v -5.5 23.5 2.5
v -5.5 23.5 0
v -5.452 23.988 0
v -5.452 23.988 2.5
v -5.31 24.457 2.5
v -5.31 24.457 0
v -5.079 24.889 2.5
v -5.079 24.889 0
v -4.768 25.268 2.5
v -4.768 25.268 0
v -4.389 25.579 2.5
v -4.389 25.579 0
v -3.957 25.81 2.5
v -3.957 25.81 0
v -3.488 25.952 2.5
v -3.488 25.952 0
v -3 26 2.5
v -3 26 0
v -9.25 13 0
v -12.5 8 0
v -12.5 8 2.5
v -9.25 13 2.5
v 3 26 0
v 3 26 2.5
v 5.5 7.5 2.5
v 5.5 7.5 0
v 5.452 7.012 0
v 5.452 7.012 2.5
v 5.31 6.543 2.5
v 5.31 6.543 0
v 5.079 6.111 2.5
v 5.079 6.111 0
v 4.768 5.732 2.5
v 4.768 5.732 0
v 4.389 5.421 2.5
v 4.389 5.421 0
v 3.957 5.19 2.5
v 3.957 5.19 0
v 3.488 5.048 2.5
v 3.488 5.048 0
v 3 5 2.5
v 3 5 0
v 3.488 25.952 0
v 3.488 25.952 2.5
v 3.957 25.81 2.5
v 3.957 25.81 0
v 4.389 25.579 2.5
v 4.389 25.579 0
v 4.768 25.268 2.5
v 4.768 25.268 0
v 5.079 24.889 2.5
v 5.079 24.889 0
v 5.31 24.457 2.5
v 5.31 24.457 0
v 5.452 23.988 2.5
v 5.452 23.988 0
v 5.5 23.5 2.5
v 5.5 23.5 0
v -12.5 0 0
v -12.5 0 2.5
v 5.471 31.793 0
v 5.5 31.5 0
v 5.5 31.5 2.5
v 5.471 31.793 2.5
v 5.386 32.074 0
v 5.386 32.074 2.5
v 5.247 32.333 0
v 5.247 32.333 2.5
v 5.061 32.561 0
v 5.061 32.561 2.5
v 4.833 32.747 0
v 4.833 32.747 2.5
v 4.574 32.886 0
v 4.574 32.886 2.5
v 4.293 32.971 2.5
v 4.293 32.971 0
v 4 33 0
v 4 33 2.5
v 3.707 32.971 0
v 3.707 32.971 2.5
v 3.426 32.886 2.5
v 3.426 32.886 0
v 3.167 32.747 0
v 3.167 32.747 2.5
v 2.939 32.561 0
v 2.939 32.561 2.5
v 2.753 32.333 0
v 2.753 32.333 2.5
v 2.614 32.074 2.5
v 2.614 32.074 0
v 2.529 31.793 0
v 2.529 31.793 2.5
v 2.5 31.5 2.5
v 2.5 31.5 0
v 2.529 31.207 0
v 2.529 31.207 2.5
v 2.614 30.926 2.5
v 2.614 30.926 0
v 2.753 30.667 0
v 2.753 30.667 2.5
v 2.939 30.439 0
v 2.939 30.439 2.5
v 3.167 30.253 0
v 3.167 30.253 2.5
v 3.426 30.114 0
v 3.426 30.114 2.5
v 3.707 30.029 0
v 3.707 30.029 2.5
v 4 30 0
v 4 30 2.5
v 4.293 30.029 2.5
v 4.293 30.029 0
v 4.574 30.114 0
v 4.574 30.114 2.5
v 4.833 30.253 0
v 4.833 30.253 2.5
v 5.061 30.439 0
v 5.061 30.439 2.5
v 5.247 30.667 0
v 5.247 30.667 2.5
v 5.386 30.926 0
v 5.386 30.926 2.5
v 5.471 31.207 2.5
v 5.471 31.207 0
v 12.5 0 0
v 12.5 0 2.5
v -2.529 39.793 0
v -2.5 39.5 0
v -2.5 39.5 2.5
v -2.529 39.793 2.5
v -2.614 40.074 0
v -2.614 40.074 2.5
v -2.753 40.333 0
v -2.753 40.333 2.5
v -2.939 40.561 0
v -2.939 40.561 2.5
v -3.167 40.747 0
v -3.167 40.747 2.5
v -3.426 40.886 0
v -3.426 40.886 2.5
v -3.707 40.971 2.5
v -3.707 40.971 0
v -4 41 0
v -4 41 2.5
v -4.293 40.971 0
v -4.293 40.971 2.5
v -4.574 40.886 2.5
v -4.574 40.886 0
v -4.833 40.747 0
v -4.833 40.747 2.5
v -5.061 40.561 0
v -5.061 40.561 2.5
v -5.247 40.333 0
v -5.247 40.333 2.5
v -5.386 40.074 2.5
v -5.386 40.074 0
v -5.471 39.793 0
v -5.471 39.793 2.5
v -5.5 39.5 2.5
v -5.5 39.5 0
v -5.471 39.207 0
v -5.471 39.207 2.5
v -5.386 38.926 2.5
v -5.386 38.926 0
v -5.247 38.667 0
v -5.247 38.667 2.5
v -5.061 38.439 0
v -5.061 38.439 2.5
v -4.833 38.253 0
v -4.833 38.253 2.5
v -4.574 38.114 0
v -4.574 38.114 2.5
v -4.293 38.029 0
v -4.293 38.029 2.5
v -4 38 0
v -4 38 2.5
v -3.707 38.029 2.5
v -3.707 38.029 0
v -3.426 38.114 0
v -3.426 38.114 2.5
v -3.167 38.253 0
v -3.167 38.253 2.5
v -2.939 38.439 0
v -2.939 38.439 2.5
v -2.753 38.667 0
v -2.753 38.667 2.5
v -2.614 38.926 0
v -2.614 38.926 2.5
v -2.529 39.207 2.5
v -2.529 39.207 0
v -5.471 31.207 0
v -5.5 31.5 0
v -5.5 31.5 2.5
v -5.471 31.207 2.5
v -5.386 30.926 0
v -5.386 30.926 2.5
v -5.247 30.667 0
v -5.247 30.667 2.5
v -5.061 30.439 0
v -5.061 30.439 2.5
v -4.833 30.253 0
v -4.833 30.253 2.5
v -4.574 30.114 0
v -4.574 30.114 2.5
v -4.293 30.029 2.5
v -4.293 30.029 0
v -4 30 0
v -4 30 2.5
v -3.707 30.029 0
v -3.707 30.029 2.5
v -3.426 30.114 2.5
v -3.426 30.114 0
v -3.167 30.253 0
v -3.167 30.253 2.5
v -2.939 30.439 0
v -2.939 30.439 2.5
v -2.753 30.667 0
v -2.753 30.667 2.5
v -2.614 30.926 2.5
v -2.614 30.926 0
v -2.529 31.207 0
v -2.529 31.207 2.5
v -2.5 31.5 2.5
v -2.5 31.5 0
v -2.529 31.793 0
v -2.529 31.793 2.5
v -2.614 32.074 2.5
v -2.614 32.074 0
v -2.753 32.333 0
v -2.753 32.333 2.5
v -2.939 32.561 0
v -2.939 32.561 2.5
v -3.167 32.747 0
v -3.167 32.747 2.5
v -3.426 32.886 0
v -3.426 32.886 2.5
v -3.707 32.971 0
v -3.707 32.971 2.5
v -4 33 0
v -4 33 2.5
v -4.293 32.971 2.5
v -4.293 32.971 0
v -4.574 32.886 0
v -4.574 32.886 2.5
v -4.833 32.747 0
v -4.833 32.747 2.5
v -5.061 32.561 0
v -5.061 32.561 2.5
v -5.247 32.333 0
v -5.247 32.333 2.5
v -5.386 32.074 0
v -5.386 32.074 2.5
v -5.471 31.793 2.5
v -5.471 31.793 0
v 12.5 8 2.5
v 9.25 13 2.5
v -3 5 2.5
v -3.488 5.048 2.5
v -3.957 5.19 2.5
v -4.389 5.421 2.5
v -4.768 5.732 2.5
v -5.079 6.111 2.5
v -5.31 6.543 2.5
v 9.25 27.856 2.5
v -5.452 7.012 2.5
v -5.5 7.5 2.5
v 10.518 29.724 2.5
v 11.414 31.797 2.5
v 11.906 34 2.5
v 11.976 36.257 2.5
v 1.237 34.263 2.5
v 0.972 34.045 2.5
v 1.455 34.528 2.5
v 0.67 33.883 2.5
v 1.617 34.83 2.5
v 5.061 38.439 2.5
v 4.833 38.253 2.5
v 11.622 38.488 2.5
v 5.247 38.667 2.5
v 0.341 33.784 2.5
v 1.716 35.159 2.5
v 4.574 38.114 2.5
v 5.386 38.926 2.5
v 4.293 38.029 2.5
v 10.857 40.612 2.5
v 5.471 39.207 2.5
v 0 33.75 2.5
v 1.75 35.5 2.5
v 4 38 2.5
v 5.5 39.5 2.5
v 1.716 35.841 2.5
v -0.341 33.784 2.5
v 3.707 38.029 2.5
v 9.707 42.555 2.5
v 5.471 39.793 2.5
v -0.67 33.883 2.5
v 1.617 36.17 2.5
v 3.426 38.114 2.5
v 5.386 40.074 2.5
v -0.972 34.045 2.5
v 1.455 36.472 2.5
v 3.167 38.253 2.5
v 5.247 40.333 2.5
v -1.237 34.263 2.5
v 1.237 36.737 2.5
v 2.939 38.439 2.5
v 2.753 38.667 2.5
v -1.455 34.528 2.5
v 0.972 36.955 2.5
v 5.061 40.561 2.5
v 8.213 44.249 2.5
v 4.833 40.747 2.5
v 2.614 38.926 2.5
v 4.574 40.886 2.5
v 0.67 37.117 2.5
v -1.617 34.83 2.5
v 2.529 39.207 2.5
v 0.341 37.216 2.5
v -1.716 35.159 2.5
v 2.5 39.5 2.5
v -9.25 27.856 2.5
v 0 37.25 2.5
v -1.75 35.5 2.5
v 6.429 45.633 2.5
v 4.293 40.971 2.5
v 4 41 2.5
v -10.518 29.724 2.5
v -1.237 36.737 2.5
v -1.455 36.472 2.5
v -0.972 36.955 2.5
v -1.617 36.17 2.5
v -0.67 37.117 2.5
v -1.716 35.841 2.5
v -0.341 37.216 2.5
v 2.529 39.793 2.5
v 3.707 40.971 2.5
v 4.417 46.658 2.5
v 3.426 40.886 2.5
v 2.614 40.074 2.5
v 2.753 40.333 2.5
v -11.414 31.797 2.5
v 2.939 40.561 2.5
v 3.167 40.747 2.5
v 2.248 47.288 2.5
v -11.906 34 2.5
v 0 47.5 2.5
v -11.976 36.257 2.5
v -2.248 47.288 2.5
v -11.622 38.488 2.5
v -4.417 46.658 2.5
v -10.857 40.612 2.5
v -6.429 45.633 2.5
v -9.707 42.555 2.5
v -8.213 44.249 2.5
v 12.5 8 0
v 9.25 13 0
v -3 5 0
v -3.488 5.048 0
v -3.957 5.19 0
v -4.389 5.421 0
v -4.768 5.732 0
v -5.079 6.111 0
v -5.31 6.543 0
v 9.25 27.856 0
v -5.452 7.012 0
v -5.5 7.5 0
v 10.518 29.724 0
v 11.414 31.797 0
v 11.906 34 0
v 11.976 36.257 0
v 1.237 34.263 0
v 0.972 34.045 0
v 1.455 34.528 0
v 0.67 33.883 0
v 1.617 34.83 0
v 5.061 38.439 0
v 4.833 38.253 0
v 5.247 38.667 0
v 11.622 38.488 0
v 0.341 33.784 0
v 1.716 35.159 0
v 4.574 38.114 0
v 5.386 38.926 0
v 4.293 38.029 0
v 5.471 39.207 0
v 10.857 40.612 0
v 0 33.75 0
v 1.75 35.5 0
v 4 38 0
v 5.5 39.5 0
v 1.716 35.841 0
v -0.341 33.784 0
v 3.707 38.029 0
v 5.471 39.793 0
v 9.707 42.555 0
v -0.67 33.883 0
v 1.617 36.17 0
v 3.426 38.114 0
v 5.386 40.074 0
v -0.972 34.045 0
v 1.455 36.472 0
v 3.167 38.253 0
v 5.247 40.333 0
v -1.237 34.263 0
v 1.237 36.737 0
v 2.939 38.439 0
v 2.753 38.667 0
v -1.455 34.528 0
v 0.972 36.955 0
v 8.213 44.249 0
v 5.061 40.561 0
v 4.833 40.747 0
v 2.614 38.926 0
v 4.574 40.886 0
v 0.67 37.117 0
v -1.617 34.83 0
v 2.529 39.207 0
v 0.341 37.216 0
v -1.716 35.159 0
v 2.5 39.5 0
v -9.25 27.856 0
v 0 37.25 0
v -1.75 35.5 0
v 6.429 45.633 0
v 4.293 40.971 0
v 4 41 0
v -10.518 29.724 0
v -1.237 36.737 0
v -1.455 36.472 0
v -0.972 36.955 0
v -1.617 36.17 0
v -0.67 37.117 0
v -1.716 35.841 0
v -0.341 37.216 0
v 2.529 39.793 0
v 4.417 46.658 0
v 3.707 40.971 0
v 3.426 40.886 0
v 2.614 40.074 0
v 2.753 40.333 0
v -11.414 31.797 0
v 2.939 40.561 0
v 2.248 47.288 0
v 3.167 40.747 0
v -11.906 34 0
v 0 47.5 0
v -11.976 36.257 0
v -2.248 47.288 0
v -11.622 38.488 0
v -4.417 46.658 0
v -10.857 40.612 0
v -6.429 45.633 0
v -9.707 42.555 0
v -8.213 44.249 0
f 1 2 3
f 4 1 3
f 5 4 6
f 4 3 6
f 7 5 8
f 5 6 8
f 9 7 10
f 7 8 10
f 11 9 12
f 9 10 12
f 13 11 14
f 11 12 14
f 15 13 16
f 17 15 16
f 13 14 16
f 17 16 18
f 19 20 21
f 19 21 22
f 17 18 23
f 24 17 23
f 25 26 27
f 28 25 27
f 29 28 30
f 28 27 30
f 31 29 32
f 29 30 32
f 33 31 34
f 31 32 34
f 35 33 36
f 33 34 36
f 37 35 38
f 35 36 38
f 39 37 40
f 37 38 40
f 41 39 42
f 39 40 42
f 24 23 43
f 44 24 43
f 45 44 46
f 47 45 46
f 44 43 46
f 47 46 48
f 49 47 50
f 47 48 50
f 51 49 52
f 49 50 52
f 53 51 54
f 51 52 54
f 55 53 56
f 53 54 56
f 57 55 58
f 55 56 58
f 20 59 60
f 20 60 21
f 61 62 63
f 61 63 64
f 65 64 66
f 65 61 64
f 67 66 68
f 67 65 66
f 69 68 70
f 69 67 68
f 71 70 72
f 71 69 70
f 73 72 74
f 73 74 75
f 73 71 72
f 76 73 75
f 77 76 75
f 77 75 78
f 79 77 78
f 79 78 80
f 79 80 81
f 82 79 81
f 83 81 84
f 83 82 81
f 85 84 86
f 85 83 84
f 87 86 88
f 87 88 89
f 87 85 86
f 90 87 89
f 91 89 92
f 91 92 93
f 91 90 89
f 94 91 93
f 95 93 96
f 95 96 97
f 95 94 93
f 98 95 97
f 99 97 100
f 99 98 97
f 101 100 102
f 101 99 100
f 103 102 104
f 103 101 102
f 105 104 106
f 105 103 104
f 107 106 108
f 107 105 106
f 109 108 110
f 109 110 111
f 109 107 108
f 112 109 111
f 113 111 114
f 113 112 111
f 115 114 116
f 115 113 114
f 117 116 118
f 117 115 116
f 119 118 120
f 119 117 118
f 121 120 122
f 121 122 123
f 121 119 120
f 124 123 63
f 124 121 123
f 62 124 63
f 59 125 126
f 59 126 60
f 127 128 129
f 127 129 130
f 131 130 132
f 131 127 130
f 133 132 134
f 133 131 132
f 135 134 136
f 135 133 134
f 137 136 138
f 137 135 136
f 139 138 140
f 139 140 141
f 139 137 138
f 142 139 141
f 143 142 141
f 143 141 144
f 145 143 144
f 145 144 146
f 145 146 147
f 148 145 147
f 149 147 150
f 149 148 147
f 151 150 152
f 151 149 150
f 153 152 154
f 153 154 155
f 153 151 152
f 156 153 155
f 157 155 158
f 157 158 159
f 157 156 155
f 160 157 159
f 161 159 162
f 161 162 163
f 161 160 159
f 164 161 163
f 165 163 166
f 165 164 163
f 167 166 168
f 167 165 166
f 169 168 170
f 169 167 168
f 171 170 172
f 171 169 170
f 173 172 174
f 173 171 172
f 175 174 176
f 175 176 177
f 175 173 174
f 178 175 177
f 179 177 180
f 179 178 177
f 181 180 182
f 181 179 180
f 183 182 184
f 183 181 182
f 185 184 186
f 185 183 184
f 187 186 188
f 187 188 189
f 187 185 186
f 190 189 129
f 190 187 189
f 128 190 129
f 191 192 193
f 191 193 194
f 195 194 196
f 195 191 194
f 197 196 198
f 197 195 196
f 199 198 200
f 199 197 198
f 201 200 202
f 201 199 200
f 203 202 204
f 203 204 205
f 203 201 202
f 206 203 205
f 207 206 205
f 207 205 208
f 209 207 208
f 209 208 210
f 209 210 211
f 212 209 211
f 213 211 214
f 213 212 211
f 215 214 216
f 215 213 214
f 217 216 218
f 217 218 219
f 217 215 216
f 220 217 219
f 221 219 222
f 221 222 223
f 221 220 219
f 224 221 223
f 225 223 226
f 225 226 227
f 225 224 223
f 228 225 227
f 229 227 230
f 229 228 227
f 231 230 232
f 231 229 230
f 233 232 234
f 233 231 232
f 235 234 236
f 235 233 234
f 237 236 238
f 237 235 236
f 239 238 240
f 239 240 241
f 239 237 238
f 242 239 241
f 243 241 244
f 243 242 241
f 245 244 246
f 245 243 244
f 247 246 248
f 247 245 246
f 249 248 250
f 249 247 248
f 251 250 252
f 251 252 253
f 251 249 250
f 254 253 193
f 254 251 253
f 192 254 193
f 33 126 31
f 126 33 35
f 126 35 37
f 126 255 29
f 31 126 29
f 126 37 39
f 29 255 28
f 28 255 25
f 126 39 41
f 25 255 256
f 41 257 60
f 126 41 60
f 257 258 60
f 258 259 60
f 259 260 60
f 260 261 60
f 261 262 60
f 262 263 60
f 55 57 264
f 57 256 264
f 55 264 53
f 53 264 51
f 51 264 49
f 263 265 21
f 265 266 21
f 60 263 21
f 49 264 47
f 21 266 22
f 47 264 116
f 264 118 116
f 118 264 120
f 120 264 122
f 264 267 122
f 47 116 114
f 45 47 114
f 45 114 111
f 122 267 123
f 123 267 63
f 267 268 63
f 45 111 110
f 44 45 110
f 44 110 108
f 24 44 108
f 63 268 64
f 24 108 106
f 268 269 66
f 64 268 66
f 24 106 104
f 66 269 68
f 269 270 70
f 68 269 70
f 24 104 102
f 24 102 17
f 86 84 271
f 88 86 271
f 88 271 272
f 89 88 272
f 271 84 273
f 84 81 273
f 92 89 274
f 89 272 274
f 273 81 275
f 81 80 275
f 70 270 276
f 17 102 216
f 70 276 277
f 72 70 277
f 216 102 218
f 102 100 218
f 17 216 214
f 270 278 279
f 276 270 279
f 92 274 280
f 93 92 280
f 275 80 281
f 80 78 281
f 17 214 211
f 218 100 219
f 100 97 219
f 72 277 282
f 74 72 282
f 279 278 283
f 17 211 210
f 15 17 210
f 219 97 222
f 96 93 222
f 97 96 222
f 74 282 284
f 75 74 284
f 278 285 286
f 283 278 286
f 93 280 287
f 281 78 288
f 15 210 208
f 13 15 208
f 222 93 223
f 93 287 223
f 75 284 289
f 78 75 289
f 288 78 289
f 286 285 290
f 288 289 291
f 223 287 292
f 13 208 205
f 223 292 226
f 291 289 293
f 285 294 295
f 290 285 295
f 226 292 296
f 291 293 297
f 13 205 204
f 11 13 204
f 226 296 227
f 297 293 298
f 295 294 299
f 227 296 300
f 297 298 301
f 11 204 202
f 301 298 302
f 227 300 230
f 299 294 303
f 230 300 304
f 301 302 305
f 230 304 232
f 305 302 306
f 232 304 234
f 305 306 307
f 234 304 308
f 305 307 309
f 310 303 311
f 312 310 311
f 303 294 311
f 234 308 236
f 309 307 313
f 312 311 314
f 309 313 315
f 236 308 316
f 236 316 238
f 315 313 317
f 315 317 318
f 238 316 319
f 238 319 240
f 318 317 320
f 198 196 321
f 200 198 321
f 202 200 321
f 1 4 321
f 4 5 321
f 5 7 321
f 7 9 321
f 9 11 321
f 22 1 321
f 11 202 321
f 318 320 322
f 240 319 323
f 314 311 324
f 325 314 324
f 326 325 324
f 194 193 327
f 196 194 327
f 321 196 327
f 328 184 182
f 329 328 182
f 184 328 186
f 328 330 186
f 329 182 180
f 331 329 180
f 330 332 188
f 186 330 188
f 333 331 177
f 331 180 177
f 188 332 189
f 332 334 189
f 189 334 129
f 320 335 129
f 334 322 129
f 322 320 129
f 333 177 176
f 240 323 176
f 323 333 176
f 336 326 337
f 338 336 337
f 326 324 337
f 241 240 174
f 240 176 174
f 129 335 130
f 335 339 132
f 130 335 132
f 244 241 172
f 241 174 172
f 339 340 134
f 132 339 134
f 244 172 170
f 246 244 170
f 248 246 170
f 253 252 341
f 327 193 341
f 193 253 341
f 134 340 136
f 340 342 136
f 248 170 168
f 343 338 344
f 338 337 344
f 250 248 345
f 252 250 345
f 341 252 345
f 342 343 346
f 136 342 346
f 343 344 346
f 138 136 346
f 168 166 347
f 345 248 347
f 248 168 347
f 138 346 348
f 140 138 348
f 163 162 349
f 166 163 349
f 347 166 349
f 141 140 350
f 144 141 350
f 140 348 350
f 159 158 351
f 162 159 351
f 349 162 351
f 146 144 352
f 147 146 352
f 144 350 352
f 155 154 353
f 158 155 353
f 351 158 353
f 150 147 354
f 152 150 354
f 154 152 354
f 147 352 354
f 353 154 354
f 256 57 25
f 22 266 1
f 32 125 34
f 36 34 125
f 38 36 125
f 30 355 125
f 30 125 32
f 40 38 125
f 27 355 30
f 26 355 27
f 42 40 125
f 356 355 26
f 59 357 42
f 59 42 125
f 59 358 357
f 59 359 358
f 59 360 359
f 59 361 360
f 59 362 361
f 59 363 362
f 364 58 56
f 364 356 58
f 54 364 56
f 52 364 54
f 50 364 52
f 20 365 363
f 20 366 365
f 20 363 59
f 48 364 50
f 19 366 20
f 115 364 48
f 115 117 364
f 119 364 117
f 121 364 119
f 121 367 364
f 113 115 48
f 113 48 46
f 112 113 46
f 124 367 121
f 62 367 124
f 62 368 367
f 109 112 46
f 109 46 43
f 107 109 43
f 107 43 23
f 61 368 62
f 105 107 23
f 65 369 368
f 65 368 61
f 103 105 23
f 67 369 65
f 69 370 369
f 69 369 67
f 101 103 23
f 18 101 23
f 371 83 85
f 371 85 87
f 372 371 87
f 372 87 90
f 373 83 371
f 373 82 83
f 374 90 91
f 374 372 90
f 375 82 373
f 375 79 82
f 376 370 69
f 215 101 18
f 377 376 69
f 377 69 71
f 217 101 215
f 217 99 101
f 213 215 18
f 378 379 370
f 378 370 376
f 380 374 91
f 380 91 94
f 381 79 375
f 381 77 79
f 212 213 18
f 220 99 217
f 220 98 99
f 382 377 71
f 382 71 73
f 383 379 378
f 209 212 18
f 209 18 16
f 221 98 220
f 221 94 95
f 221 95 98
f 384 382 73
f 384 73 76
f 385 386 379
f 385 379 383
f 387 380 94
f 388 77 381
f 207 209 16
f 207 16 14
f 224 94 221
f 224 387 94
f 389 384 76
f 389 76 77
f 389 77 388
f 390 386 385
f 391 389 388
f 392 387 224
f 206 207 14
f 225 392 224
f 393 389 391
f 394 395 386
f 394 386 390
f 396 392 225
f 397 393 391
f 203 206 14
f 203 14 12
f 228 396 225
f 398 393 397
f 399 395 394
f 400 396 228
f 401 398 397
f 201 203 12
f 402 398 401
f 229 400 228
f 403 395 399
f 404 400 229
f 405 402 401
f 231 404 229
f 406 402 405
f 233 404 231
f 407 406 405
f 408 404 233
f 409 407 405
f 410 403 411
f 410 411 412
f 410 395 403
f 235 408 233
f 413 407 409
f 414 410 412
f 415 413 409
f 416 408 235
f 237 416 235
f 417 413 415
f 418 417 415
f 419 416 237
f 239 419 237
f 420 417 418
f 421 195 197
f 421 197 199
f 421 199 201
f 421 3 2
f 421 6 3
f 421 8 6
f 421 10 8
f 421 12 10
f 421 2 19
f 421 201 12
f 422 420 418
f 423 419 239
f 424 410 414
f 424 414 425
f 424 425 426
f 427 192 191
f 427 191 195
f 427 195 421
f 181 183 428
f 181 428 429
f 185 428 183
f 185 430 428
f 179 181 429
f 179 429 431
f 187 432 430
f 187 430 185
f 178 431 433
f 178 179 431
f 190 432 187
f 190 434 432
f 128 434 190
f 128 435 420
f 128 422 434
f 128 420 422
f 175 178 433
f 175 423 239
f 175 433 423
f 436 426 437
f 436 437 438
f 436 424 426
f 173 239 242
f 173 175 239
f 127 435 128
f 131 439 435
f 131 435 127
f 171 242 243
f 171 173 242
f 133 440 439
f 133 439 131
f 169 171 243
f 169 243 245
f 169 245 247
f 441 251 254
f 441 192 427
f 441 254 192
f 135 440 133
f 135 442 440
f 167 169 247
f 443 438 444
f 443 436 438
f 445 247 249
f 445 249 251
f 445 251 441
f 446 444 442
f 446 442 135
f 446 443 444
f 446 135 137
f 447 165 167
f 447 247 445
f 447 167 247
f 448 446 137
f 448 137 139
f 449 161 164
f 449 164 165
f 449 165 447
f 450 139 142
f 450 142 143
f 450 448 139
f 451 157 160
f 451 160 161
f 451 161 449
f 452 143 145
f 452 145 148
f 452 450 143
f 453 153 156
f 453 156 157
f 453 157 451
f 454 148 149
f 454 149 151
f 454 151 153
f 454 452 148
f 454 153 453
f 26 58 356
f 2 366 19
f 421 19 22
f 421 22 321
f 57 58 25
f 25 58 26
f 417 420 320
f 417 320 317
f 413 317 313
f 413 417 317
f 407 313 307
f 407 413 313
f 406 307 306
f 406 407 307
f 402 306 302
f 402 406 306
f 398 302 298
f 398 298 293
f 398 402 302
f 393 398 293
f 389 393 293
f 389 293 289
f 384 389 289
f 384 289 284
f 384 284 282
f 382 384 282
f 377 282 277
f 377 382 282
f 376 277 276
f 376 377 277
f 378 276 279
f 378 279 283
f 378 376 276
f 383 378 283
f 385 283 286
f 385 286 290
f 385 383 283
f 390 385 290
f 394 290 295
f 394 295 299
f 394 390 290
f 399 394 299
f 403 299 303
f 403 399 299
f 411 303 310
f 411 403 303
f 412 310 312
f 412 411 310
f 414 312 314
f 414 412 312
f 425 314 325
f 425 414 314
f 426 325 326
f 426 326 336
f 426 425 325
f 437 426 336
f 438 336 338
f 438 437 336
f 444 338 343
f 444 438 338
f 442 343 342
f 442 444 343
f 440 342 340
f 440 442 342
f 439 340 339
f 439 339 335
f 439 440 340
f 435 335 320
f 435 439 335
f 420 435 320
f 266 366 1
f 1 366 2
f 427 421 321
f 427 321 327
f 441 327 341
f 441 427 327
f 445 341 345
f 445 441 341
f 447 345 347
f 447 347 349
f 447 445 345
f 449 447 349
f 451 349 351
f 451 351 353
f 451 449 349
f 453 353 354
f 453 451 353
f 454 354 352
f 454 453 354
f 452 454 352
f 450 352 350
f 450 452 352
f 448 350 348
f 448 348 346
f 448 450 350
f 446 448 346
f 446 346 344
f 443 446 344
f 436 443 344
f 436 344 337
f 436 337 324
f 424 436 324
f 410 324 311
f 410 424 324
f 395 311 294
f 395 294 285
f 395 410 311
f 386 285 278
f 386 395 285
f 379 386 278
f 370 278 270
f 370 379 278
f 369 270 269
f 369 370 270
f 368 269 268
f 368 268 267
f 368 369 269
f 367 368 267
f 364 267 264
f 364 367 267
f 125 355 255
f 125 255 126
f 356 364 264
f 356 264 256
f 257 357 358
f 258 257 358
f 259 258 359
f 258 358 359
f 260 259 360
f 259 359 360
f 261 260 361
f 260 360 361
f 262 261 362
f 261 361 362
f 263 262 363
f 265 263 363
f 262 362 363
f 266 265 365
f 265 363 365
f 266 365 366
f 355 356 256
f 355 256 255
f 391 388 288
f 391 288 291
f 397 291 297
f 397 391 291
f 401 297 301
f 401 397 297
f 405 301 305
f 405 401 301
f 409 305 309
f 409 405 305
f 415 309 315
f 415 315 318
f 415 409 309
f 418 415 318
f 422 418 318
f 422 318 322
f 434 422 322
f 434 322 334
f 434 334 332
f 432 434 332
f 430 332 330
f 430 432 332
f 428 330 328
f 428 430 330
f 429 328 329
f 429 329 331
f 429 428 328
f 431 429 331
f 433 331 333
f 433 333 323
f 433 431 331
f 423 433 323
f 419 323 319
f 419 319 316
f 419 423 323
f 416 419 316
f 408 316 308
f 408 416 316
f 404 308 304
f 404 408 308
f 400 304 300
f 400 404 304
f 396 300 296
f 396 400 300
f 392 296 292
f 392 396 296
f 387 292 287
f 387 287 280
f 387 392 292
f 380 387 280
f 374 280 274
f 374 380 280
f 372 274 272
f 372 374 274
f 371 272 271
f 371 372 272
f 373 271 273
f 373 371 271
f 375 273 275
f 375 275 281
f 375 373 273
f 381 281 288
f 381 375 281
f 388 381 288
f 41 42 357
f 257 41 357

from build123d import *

# Parameters (mm, degrees)
SZKIC1_R                    = 1.75
SZKIC1_R_2                  = 1.5
DODANIE_WYCI_GNI_CIE1_DEPTH = 2.5


with BuildPart() as part:
    # Szkic1 → Dodanie-wyciągnięcie1 (new body)
    with BuildSketch(Plane.XY):
        with BuildLine():
            Line((12.5, 0), (-12.5, 0))
            Line((-12.5, 0), (-12.5, 8))
            Line((-12.5, 8), (-9.25, 13))
            Line((-9.25, 13), (-9.25, 27.855557574))
            ThreePointArc((-9.25, 27.855557574), (0, 47.5), (9.25, 27.855557574))
            Line((9.25, 27.855557574), (9.25, 13))
            Line((9.25, 13), (12.5, 8))
            Line((12.5, 8), (12.5, 0))
        make_face()
        with Locations((0, 35.5)):
            Circle(SZKIC1_R, mode=Mode.SUBTRACT)
        with Locations((-4, 39.5)):
            Circle(SZKIC1_R_2, mode=Mode.SUBTRACT)
        with Locations(Location((-4, 31.5, 0), (0, 0, 180))):
            Circle(SZKIC1_R_2, mode=Mode.SUBTRACT)
        with Locations((4, 31.5)):
            Circle(SZKIC1_R_2, mode=Mode.SUBTRACT)
        with Locations(Location((4, 39.5, 0), (0, 0, 180))):
            Circle(SZKIC1_R_2, mode=Mode.SUBTRACT)
        with BuildLine():
            Line((3, 5), (-3, 5))
            ThreePointArc((-3, 5), (-4.767766953, 5.732233047), (-5.5, 7.5))
            Line((-5.5, 7.5), (-5.5, 23.5))
            ThreePointArc((-5.5, 23.5), (-4.767766953, 25.267766953), (-3, 26))
            Line((-3, 26), (3, 26))
            ThreePointArc((3, 26), (4.767766953, 25.267766953), (5.5, 23.5))
            Line((5.5, 23.5), (5.5, 7.5))
            ThreePointArc((5.5, 7.5), (4.767766953, 5.732233047), (3, 5))
        make_face(mode=Mode.SUBTRACT)
    extrude(amount=DODANIE_WYCI_GNI_CIE1_DEPTH)


solid = part.part
